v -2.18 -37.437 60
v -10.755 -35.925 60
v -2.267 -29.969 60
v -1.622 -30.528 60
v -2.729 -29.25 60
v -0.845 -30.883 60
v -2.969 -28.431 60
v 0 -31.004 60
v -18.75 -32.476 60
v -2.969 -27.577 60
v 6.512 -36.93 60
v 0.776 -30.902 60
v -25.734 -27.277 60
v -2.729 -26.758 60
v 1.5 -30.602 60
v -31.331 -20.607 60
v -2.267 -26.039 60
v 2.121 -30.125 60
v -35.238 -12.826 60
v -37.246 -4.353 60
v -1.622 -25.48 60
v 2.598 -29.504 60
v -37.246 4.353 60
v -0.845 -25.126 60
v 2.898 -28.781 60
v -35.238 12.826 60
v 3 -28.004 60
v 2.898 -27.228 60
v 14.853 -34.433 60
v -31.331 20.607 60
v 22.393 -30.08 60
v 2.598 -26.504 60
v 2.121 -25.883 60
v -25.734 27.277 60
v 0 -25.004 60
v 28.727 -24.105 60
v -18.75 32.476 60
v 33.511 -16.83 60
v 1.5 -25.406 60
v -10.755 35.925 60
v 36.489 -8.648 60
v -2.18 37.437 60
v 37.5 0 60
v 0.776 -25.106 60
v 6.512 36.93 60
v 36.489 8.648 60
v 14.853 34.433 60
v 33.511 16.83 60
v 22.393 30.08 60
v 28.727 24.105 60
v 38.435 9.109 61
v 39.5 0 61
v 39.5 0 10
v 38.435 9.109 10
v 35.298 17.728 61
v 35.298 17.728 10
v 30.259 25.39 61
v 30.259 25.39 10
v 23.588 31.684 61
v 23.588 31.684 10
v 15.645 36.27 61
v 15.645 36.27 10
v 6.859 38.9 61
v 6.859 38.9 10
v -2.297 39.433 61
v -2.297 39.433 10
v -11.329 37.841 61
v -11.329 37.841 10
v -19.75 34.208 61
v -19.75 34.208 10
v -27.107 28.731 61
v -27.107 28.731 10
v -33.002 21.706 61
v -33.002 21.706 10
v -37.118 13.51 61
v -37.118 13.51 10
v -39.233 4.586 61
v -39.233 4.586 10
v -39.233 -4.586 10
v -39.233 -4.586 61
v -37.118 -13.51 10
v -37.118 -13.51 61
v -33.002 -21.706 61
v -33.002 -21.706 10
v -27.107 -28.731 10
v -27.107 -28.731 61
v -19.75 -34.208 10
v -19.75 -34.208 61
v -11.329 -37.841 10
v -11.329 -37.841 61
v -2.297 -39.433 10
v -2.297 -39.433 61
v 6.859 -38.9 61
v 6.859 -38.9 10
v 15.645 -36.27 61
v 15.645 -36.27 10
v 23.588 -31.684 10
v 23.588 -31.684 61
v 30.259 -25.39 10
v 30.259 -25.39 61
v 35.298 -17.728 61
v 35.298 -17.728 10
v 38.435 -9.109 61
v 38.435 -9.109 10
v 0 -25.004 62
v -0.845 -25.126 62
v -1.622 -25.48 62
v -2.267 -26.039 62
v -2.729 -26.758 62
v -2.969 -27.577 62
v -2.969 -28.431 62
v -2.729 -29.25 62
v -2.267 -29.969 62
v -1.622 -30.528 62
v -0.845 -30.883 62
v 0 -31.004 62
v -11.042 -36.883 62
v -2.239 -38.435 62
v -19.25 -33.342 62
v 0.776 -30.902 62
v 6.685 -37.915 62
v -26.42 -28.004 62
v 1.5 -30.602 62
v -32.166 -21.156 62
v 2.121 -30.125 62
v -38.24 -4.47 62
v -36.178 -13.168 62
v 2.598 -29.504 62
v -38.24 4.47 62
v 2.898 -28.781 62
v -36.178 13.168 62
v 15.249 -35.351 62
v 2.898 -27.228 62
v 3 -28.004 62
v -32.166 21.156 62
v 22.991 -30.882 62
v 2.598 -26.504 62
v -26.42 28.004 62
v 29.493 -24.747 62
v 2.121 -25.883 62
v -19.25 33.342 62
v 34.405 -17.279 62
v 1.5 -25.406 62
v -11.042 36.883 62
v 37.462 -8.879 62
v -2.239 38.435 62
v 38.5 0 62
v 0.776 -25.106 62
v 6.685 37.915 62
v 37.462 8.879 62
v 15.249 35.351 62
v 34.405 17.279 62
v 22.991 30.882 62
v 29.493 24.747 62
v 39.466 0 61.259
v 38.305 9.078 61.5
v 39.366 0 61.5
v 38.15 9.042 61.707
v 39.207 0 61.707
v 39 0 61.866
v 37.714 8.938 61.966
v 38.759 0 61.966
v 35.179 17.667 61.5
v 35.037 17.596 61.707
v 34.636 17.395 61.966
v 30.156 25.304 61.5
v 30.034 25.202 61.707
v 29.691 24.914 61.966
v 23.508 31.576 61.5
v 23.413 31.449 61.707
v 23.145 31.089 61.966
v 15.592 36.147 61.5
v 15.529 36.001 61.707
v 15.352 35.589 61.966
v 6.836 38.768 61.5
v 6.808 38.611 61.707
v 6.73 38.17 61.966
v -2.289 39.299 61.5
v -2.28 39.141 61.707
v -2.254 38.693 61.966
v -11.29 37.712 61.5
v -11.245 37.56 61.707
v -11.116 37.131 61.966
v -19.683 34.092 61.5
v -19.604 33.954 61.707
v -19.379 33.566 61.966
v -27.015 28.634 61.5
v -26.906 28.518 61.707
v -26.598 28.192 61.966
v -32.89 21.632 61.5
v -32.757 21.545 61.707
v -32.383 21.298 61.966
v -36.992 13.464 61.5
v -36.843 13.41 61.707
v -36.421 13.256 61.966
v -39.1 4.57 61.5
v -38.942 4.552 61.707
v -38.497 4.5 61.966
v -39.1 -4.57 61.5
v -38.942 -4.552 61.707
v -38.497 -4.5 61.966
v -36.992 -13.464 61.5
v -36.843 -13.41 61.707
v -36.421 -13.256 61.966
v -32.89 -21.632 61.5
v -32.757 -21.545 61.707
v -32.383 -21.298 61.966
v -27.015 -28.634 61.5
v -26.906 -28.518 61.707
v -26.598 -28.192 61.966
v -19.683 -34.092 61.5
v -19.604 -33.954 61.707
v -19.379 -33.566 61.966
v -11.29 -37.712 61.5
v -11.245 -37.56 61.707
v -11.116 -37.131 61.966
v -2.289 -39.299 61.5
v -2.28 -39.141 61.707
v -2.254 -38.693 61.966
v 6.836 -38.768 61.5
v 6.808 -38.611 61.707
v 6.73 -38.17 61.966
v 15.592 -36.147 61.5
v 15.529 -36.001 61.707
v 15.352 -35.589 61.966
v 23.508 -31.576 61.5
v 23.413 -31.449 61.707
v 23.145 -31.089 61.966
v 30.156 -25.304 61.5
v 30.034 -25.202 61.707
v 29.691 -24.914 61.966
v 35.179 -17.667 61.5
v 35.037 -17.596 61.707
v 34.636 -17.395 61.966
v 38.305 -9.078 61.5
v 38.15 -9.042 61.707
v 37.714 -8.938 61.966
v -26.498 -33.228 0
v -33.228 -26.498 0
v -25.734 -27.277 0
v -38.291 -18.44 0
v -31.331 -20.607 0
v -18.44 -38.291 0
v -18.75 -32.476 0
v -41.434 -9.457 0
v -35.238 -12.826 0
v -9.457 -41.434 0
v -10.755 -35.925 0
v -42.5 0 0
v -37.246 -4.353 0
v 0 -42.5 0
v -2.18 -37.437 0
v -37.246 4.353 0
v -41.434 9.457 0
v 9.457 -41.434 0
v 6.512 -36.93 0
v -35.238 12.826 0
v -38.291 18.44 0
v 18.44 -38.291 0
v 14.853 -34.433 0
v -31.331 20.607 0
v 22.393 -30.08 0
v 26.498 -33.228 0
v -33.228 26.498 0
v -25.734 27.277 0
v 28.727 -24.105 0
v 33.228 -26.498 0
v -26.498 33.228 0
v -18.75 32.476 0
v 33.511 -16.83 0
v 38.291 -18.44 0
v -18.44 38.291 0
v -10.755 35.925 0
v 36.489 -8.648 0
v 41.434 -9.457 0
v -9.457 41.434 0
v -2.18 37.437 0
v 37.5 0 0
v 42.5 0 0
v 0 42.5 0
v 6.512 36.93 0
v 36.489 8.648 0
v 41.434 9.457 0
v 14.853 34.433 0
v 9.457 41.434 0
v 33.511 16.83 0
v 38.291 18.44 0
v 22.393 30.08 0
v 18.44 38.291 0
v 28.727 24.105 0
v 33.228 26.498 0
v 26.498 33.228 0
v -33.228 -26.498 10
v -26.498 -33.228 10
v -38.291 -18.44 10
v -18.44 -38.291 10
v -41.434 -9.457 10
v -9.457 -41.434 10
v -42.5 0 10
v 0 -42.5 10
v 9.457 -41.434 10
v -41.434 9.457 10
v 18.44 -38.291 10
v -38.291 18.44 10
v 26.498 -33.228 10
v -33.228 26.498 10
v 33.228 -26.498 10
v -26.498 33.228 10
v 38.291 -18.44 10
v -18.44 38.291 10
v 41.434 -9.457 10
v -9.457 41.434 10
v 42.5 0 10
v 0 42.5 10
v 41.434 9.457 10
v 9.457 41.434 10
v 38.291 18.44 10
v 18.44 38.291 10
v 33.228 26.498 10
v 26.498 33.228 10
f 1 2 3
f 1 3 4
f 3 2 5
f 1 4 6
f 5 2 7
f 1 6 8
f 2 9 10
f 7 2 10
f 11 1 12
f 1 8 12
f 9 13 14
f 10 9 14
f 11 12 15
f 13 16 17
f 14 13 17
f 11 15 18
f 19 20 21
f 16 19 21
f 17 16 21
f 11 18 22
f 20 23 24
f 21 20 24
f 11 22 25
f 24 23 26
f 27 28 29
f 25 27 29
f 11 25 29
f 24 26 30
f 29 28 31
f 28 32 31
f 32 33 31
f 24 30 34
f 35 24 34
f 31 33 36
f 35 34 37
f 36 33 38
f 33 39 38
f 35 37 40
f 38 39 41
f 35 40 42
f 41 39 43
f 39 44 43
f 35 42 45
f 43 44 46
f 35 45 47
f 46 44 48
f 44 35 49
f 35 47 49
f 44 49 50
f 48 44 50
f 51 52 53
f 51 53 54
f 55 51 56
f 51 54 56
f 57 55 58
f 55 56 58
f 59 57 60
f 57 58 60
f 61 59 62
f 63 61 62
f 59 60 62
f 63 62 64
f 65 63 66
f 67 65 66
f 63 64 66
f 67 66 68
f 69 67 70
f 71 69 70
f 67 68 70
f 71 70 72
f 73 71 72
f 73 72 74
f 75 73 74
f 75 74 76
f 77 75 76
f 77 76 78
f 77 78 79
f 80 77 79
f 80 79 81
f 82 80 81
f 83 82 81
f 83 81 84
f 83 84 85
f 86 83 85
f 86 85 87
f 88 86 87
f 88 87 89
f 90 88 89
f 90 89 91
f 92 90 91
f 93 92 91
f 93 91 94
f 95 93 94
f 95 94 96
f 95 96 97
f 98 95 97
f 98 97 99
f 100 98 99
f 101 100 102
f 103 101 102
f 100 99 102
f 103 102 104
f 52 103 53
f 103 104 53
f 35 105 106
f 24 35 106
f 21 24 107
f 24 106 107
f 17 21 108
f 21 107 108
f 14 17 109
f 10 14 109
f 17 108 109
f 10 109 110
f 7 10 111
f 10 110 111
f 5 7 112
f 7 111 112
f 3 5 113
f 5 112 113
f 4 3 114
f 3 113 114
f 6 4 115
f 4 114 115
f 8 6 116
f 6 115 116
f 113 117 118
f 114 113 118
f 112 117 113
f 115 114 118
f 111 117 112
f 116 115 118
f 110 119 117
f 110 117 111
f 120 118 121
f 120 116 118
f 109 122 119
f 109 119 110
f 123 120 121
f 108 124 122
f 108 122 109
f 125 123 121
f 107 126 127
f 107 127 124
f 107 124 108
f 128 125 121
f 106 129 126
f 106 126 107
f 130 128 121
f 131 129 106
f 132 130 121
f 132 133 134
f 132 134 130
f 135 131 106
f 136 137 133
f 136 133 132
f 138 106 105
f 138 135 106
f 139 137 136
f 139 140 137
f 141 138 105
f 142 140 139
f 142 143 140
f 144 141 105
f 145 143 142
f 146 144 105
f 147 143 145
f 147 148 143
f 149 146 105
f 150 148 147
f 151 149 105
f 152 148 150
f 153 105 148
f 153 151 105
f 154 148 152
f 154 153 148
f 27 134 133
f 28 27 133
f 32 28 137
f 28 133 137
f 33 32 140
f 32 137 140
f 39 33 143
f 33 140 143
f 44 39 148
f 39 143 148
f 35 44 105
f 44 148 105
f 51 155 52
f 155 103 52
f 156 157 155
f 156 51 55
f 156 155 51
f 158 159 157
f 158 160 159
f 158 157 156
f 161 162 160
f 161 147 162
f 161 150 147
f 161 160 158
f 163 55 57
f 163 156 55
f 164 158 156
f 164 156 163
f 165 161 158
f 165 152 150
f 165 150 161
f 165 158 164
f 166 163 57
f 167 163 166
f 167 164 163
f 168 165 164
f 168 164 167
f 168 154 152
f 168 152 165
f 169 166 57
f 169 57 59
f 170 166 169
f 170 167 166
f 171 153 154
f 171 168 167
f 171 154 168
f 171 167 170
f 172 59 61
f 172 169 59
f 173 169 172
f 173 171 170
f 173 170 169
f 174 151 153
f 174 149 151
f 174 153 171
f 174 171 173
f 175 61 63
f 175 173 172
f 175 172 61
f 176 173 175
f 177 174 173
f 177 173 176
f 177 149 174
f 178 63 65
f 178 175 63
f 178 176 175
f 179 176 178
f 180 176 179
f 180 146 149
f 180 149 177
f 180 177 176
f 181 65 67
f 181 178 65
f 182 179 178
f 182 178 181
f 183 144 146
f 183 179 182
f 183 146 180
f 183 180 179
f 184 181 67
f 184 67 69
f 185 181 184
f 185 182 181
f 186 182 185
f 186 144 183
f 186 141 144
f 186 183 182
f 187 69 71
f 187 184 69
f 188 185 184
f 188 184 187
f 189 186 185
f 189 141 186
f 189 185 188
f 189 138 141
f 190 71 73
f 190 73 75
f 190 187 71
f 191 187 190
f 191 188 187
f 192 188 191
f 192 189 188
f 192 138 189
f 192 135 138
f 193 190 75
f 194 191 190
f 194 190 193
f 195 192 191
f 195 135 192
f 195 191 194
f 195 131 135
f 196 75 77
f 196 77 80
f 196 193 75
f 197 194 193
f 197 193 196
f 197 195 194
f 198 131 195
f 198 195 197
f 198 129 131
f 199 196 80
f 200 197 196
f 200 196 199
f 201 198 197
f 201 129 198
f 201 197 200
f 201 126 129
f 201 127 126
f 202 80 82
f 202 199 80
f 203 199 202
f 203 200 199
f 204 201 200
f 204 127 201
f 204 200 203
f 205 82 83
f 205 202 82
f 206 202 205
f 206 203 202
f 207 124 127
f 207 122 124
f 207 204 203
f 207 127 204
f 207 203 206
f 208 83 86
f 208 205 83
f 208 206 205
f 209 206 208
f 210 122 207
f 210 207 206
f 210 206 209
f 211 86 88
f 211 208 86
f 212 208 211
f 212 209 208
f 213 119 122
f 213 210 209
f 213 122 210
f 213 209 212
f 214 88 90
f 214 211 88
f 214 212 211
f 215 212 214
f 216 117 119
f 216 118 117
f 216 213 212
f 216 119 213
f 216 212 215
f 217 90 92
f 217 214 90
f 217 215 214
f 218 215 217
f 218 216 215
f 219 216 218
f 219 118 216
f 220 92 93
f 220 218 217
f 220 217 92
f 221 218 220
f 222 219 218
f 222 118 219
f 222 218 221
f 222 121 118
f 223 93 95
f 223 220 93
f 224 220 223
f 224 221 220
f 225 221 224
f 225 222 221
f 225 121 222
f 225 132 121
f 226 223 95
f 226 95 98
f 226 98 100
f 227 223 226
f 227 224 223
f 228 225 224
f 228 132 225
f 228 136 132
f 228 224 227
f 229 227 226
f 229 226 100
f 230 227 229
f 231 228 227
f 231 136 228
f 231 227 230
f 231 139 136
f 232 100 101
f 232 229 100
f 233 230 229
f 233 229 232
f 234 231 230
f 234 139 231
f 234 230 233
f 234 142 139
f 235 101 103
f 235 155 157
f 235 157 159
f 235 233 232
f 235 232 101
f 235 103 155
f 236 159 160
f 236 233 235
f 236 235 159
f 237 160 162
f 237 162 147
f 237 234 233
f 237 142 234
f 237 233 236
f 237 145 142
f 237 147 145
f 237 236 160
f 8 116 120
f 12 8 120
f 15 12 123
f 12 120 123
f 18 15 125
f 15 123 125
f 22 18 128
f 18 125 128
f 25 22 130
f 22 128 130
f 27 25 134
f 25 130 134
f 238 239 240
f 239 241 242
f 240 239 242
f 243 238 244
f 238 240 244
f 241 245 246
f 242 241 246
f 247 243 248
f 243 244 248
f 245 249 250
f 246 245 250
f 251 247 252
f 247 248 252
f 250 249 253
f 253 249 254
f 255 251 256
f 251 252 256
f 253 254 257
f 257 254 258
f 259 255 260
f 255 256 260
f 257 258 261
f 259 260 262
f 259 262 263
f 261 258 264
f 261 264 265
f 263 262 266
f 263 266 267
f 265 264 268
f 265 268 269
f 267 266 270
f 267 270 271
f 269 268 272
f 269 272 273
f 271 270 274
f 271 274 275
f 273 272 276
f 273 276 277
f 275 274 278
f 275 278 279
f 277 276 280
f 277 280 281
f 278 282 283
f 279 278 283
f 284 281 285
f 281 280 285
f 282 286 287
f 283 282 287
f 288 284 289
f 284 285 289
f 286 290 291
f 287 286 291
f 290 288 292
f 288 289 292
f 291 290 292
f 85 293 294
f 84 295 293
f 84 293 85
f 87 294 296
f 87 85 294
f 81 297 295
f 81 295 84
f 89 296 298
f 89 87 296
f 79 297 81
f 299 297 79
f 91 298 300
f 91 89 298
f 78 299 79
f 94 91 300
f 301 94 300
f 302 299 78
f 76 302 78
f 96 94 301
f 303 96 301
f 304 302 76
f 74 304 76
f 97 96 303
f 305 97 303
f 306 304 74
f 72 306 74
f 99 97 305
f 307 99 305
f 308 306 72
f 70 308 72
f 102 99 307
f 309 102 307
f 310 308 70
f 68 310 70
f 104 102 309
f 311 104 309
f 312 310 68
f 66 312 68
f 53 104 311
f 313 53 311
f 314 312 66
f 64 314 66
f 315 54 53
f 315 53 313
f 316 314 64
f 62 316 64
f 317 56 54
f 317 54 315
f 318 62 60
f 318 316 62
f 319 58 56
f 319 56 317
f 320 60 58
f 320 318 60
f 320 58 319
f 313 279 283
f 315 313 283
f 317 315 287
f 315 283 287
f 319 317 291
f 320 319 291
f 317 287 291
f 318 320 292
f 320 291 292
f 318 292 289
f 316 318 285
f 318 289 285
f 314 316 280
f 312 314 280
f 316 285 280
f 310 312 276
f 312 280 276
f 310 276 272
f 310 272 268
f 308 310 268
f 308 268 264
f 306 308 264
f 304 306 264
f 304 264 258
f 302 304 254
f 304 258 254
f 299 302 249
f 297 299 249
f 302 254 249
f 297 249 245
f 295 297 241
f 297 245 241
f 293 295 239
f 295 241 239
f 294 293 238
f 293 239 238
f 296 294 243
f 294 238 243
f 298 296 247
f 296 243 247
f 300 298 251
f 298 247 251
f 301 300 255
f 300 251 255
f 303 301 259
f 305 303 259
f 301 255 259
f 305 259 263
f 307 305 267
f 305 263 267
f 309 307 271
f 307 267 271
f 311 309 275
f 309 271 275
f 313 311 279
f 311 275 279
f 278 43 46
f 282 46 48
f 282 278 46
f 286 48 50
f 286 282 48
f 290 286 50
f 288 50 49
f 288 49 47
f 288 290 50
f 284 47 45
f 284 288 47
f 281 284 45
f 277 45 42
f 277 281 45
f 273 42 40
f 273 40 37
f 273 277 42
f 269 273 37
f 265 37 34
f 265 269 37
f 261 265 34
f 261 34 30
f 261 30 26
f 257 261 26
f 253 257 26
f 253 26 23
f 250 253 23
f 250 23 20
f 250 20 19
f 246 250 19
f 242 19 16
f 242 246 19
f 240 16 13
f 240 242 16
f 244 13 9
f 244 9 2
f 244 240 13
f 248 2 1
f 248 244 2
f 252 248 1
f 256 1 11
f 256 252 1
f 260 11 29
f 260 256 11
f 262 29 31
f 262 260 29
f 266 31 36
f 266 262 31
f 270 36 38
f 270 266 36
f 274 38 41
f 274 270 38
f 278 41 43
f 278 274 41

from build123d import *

# Parameters (mm, degrees)
SKETCH1_R           = 42.5
SKETCH1_R_2         = 37.5
BOSS_EXTRUDE1_DEPTH = 10
SKETCH2_R           = 39.5
SKETCH2_R_2         = 37.5
BOSS_EXTRUDE2_DEPTH = 50
SKETCH3_R           = 39.5
BOSS_EXTRUDE3_DEPTH = 2
FILLET1_R           = 1
CUT_EXTRUDE1_DEPTH  = 100


with BuildPart() as part:
    # Sketch1 → Boss-Extrude1 (new body)
    with BuildSketch(Plane.XY):
        Circle(SKETCH1_R)
        Circle(SKETCH1_R_2, mode=Mode.SUBTRACT)
    extrude(amount=BOSS_EXTRUDE1_DEPTH)

    # Sketch2 → Boss-Extrude2 (add)
    with BuildSketch(Plane.XY.offset(10)):
        Circle(SKETCH2_R)
        Circle(SKETCH2_R_2, mode=Mode.SUBTRACT)
    extrude(amount=BOSS_EXTRUDE2_DEPTH)

    # Sketch3 → Boss-Extrude3 (add)
    with BuildSketch(Plane.XY.offset(60)):
        Circle(SKETCH3_R)
    extrude(amount=BOSS_EXTRUDE3_DEPTH)

    # Fillet1
    fillet1_edges = [part.edges().sort_by_distance(p)[0] for p in [
        (-39.5, 0, 62),
    ]]
    fillet(fillet1_edges, radius=FILLET1_R)

    # Sketch4 → Cut-Extrude1 (cut)
    with BuildSketch(Plane.XY.offset(62)):
        with BuildLine():
            ThreePointArc((0, -25.004064668), (-3, -28.004064668), (0, -31.004064668))
            Line((0, -31.004064668), (0, -25.004064668))
        make_face()
        with BuildLine():
            Line((0, -25.004064668), (0, -31.004064668))
            ThreePointArc((0, -31.004064668), (2.121320344, -30.125385012), (3, -28.004064668))
            ThreePointArc((3, -28.004064668), (2.121320344, -25.882744324), (0, -25.004064668))
        make_face()
    extrude(amount=-CUT_EXTRUDE1_DEPTH, mode=Mode.SUBTRACT)


solid = part.part
